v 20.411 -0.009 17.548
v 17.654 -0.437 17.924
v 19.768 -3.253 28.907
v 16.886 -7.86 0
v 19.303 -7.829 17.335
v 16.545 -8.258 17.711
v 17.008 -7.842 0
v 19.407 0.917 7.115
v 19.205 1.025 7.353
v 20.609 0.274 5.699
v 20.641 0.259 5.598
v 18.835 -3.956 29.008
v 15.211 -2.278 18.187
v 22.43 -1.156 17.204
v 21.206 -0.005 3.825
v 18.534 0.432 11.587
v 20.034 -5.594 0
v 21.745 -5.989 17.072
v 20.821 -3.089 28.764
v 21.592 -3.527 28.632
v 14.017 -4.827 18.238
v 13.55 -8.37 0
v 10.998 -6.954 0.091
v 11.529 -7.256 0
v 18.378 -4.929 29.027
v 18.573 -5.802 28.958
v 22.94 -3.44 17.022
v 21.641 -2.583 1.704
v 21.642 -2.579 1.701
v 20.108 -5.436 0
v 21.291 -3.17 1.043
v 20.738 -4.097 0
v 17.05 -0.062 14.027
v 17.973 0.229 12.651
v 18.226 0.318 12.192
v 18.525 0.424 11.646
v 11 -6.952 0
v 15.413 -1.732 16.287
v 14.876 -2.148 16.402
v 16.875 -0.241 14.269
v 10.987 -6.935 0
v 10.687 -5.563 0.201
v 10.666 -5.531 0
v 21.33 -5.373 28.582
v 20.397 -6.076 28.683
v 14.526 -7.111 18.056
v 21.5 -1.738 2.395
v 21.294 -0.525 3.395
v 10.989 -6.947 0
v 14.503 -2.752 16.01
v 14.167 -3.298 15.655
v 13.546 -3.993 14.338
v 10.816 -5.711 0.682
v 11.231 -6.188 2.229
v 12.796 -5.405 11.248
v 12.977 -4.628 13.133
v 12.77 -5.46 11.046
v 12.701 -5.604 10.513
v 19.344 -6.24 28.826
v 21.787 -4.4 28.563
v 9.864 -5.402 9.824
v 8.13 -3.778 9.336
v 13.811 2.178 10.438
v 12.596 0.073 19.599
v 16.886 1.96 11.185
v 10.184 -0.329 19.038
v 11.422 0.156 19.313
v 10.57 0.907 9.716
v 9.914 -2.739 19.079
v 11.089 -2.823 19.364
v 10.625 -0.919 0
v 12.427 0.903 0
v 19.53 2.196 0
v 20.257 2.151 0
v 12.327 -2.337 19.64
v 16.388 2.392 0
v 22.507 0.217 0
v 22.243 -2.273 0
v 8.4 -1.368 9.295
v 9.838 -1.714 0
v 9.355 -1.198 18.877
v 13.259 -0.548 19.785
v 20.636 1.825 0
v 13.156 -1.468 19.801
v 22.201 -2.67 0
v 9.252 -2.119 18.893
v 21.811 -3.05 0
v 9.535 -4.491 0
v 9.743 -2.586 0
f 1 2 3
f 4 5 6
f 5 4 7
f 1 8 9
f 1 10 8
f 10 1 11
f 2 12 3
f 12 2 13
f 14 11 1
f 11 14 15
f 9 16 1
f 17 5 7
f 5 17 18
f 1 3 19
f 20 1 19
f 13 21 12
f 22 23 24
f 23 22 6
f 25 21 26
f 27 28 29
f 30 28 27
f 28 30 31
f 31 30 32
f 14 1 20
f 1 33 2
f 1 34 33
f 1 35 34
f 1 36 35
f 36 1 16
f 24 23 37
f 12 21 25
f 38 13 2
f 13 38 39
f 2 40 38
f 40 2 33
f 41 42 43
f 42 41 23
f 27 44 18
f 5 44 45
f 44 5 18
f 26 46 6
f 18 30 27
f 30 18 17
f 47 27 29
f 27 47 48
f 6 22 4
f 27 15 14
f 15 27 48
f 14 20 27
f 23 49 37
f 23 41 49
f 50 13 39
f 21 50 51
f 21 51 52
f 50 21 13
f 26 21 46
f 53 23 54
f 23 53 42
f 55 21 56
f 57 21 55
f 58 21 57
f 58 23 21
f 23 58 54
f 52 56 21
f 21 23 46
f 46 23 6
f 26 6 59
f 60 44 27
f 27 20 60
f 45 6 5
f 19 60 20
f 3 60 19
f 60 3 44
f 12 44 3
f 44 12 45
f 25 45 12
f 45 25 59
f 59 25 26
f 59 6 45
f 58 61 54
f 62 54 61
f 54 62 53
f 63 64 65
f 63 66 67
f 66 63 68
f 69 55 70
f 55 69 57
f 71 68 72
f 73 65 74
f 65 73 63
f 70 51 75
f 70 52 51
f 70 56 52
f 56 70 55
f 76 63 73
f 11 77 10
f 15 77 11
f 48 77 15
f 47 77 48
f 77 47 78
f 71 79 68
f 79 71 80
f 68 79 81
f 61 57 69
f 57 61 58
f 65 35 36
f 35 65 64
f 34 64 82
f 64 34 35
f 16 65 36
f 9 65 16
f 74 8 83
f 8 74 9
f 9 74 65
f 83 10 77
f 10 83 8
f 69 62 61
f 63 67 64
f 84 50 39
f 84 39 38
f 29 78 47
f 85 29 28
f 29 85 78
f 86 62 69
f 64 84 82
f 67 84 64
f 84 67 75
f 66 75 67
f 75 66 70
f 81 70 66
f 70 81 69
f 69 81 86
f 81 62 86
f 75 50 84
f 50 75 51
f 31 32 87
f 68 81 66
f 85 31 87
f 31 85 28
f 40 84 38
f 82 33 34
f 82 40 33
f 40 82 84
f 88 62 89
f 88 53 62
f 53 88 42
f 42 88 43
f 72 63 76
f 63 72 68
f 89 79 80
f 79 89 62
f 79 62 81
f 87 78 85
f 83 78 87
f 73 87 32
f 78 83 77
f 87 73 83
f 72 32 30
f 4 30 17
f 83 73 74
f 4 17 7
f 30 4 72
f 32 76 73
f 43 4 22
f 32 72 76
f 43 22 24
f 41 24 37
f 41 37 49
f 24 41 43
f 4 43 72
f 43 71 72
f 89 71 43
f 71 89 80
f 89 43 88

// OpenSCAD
/* [Global] */
/* [Cacti settings] */
// The amount of cacti still randomizes, this just ups the highest limit. ALSO WHAT YOU SEE IS NOT WHAT GETS GENERATED! Just click the button and see what it churns out.
num_of_cacti = 5; // [1:50]
// This is a static number, all cacti will have the same number of side facets.
cacti_side_facets = 10; // [5:50]


/* [Hidden] */
listcactip = rands(0,num_of_cacti,1);

module cactusPart(height){
    listcw = rands(.55,.85,1);
    cactusw=listcw[0];
    listcl = rands(.35,.45,1);
    cactusl=listcl[0];
    listch = rands(1.75,3,1);
    cactush=listch[0];
    difference(){
        scale([cactusw,cactusl,cactush]) sphere(d=height, $fn = cacti_side_facets);
        translate([-10,-10,-90])cube([1000,1000,80]);
    }
}

module cactusMake(){
    cactip=listcactip[0];
    for (i = [0 : cactip]){
        //i in the list lets us pull 1 of the num_of_cacti values generated depending on what i is as it cycles the for loop.
        //angles start here.
        listcxa = rands(-20,20,num_of_cacti);
        cactusxa=listcxa[i];
        listcya = rands(-20,20,num_of_cacti);
        cactusya=listcya[i];
        listcza = rands(-40,40,num_of_cacti);
        cactusza=listcza[i];

        //axises start here.
        listcx = rands(-25,25,num_of_cacti);
        cactusx=listcx[i];
        listcy = rands(-25,25,num_of_cacti);
        cactusy=listcy[i];
        listcz = rands(-5,0,num_of_cacti);
        cactusz = listcz[i];
        
        //Height value for the generator.
        listcsh = rands(10,30,num_of_cacti);
        cactussh = listcsh[i];
        //Combining the code.
        color([.3, .5, .3])translate([cactusx,cactusy,cactusz])rotate([cactusxa,cactusya,cactusza])cactusPart(cactussh);
        i=i+1;
    }
}

difference(){
    cactusMake();
     translate([0,0,-15])cube([100,100,30],true);
}
color([.9, .7, .3])translate([0,0,0])scale([1,1,4])circle(50,h=10);
